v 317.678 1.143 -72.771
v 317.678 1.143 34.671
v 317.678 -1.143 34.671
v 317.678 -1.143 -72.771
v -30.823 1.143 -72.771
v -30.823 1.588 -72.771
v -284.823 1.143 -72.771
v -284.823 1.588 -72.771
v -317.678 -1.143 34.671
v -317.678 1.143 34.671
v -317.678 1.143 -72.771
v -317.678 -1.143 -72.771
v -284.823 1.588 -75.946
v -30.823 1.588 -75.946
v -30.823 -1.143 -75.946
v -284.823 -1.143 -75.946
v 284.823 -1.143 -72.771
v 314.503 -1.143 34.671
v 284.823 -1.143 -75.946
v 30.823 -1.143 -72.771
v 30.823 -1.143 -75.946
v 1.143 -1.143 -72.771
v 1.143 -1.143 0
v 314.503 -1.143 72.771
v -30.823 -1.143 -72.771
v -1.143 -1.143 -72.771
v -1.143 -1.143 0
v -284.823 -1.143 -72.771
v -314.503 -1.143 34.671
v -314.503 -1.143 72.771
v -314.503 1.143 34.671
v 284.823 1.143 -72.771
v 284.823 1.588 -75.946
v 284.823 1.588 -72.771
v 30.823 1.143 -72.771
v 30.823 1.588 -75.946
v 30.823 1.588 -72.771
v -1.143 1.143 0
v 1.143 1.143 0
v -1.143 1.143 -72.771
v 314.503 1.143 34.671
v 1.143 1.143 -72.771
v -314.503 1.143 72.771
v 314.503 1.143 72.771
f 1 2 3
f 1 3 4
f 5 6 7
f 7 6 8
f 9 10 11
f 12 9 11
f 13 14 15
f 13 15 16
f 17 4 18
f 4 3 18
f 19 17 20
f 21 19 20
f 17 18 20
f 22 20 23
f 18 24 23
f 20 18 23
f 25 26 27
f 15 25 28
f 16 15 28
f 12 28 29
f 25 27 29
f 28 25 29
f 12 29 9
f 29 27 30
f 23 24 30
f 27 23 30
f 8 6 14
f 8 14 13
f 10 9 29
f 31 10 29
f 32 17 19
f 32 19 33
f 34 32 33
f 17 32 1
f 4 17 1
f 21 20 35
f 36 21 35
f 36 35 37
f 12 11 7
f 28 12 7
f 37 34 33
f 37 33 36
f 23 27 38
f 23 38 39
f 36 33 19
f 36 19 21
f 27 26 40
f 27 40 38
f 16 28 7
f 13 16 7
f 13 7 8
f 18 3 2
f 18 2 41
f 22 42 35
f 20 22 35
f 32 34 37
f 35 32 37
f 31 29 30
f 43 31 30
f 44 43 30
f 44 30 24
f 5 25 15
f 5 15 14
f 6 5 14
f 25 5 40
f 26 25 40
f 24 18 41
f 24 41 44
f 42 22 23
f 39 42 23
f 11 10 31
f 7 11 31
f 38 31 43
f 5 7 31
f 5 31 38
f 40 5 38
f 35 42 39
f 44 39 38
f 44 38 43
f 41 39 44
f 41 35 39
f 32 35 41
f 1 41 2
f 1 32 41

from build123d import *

# Parameters (mm, degrees)
SKETCH1_W           = 635.3556
SKETCH1_H           = 145.542
BOSS_EXTRUDE1_DEPTH = 1.143
SKETCH2_W           = 254
SKETCH2_H           = 2.7305
BOSS_EXTRUDE2_DEPTH = 3.175
SKETCH3_W           = 3.175
SKETCH3_H           = 38.1
CUT_EXTRUDE1_DEPTH  = 3.7305
SKETCH4_W           = 2.286
SKETCH4_H           = 72.771
CUT_EXTRUDE2_DEPTH  = 3.7305


with BuildPart() as part:
    # Sketch1 → Boss-Extrude1 (new body, symmetric)
    with BuildSketch(Plane(origin=(0, 0, 0), x_dir=(1, 0, 0), z_dir=(0, 1, 0))):
        Rectangle(SKETCH1_W, SKETCH1_H)
    extrude(amount=BOSS_EXTRUDE1_DEPTH, both=True)

    # Sketch2 → Boss-Extrude2 (add)
    with BuildSketch(Plane(origin=(0, 0, -72.771), x_dir=(-1, 0, 0), z_dir=(0, 0, -1))):
        with Locations((-157.8229, 0.22225)):
            Rectangle(SKETCH2_W, SKETCH2_H)
        with Locations((157.8229, 0.22225)):
            Rectangle(SKETCH2_W, SKETCH2_H)
    extrude(amount=BOSS_EXTRUDE2_DEPTH)

    # Sketch3 → Cut-Extrude1 (cut, through all)
    with BuildSketch(Plane.XZ.offset(1.143)):
        with Locations((-316.0903, 53.721)):
            Rectangle(SKETCH3_W, SKETCH3_H)
    cut_extrude1 = extrude(amount=-CUT_EXTRUDE1_DEPTH, mode=Mode.SUBTRACT)

    # Mirror1: Cut-Extrude1 across plane
    add(cut_extrude1.mirror(Plane(origin=(0, 0, 0), x_dir=(0, 0, 1), z_dir=(1, 0, 0))), mode=Mode.SUBTRACT)

    # Sketch4 → Cut-Extrude2 (cut, through all)
    with BuildSketch(Plane.XZ.offset(1.143)):
        with Locations((0, -36.3855)):
            Rectangle(SKETCH4_W, SKETCH4_H)
    extrude(amount=-CUT_EXTRUDE2_DEPTH, mode=Mode.SUBTRACT)


solid = part.part
